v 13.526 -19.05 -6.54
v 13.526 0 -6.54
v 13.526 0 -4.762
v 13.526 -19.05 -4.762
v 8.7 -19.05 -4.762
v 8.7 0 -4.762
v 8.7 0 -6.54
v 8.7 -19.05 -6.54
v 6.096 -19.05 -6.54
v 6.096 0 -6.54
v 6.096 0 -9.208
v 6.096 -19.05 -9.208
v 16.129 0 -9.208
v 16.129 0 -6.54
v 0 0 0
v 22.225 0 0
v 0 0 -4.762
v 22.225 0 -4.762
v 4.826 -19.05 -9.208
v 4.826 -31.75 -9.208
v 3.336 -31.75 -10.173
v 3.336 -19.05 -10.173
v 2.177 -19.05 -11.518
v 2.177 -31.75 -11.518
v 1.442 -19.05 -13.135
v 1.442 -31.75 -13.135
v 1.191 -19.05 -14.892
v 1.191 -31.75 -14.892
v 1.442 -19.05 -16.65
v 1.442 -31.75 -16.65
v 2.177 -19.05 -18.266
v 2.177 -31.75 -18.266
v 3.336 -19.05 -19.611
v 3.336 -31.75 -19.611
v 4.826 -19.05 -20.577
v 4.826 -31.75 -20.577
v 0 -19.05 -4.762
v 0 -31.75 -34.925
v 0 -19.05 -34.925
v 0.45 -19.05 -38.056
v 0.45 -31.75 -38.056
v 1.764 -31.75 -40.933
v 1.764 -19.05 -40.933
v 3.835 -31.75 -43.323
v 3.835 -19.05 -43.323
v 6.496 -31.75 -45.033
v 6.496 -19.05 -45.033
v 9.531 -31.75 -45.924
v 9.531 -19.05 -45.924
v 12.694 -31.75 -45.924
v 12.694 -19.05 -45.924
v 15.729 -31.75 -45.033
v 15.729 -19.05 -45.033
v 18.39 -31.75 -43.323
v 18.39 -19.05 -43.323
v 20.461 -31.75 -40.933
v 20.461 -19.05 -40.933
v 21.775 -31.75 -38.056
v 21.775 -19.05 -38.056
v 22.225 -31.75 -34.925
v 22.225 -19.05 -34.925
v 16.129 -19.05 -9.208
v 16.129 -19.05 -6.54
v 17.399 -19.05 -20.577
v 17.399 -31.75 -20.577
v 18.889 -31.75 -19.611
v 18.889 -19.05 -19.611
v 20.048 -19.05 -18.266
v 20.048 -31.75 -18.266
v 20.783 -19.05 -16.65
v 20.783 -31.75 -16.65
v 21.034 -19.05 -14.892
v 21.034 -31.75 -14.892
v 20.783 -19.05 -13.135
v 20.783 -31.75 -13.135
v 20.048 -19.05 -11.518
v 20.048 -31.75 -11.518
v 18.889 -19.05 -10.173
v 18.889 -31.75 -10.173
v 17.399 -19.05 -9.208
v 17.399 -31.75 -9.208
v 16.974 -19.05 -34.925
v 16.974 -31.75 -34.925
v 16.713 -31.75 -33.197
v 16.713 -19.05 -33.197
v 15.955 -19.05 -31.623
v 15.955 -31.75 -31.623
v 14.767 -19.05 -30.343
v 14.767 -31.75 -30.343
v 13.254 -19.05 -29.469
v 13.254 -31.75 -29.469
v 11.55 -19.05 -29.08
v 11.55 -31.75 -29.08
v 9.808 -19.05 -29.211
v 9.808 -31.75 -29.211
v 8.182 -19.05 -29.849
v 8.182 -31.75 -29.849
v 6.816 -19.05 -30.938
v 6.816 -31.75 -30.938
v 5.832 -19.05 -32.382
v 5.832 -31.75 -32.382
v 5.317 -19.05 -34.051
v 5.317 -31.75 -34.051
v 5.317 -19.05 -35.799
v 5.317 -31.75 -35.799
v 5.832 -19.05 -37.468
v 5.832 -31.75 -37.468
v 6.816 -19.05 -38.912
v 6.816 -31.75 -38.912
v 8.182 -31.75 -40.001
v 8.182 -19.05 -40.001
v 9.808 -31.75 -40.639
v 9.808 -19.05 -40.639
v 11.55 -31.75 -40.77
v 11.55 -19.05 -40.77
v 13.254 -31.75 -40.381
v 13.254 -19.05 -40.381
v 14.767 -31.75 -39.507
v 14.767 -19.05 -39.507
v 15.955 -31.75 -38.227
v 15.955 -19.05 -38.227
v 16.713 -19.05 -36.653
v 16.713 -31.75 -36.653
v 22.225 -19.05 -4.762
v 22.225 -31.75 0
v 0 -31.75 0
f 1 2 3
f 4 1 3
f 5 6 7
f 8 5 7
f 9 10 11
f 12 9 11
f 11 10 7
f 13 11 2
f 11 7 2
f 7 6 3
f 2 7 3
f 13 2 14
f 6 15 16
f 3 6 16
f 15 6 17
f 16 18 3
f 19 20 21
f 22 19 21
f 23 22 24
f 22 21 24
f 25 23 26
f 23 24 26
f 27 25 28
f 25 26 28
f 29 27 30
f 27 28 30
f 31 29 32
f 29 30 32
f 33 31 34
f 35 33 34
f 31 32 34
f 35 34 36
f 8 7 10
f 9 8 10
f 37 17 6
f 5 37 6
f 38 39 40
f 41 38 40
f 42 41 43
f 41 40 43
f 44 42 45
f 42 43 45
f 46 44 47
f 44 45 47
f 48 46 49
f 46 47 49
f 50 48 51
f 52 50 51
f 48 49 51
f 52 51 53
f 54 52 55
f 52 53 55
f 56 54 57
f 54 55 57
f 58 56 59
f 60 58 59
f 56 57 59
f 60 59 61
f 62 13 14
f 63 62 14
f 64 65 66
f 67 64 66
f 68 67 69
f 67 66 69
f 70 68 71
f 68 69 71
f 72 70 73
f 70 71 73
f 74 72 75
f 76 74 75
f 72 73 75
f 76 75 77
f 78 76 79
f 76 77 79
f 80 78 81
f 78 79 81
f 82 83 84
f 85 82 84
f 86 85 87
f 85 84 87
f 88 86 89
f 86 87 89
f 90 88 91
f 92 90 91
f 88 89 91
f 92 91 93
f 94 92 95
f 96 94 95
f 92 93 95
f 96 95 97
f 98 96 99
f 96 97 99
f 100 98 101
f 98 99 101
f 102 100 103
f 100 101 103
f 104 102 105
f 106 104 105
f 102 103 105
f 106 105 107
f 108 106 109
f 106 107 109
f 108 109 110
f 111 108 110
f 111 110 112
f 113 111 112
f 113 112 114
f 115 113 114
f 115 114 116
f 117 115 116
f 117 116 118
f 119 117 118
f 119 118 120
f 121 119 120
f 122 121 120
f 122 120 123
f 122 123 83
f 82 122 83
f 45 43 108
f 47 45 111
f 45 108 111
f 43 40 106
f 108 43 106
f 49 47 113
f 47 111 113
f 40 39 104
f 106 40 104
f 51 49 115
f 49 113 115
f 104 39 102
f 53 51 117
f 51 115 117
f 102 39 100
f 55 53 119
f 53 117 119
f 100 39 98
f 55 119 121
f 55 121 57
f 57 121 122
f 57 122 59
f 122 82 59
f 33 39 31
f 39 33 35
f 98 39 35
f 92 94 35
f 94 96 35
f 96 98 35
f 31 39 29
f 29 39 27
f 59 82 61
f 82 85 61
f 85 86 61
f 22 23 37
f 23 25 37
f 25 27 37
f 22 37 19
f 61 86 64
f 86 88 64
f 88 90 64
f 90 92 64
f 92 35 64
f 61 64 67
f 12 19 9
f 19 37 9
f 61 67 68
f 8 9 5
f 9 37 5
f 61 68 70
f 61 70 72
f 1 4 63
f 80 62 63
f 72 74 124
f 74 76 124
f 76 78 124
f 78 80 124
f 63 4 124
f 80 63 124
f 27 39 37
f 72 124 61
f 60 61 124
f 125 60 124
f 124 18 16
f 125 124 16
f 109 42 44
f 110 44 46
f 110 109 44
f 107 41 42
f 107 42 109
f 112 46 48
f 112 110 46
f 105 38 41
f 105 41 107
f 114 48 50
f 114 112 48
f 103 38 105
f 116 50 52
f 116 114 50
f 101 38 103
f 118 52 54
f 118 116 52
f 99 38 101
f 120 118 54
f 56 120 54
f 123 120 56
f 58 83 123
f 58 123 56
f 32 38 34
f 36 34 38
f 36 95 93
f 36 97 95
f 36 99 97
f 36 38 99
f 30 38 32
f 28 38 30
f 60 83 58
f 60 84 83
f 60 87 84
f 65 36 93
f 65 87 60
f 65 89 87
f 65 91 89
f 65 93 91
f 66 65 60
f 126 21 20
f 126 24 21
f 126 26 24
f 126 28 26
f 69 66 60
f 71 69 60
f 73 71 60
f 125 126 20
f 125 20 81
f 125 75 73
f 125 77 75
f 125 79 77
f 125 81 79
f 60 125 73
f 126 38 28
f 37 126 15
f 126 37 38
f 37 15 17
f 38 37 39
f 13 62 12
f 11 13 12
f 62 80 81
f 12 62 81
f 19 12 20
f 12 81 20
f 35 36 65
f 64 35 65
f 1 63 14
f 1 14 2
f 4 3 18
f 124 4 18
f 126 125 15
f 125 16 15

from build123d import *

# Parameters (mm, degrees)
F1_DEPTH = 19.05
F3_DEPTH = 12.7
F4_R     = 5.86105
F5_DEPTH = 25.4
F7_DEPTH = 25.4


with BuildPart() as f1:
    # F0 (on Front) → F1 (new body)
    with BuildSketch(Plane.XZ):
        Polygon((22.225, 0), (0, 0), (0, -4.7625), (8.6995, -4.7625), (8.6995, -6.5405), (6.096, -6.5405), (6.096, -9.2075), (16.129, -9.2075), (16.129, -6.5405), (13.5255, -6.5405), (13.5255, -4.7625), (22.225, -4.7625), align=None)
    extrude(amount=F1_DEPTH)

    # F2 (on face) → F3 (join)
    with BuildSketch(Plane.XZ.offset(19.05)):
        with BuildLine():
            Line((8.6995, -4.7625), (0, -4.7625))
            Line((0, -4.7625), (0, -34.925))
            ThreePointArc((0, -34.925), (11.1125, -46.0375), (22.225, -34.925))
            Line((22.225, -34.925), (22.225, -4.7625))
            Line((22.225, -4.7625), (13.5255, -4.7625))
            Line((13.5255, -4.7625), (13.5255, -6.5405))
            Line((13.5255, -6.5405), (16.129, -6.5405))
            Line((16.129, -6.5405), (16.129, -9.2075))
            Line((16.129, -9.2075), (6.096, -9.2075))
            Line((6.096, -9.2075), (6.096, -6.5405))
            Line((6.096, -6.5405), (8.6995, -6.5405))
            Line((8.6995, -6.5405), (8.6995, -4.7625))
        make_face()
        Polygon((22.225, 0), (0, 0), (0, -4.7625), (8.6995, -4.7625), (8.6995, -6.5405), (6.096, -6.5405), (6.096, -9.2075), (16.129, -9.2075), (16.129, -6.5405), (13.5255, -6.5405), (13.5255, -4.7625), (22.225, -4.7625), align=None)
    extrude(amount=F3_DEPTH)

    # F4 (on face) → F5 (cut)
    with BuildSketch(Plane.XZ.offset(31.75)):
        with Locations((11.1125, -34.925)):
            Circle(F4_R)
    extrude(amount=-F5_DEPTH, mode=Mode.SUBTRACT)

    # F6 (on face) → F7 (cut)
    with BuildSketch(Plane.XZ.offset(31.75)):
        with BuildLine():
            Line((17.399, -9.2075), (4.826, -9.2075))
            ThreePointArc((4.826, -9.2075), (1.190625, -14.892203), (4.826, -20.576906))
            Line((4.826, -20.576906), (17.399, -20.576906))
            ThreePointArc((17.399, -20.576906), (21.034375, -14.892203), (17.399, -9.2075))
        make_face()
    extrude(amount=-F7_DEPTH, mode=Mode.SUBTRACT)


solid = f1.part
